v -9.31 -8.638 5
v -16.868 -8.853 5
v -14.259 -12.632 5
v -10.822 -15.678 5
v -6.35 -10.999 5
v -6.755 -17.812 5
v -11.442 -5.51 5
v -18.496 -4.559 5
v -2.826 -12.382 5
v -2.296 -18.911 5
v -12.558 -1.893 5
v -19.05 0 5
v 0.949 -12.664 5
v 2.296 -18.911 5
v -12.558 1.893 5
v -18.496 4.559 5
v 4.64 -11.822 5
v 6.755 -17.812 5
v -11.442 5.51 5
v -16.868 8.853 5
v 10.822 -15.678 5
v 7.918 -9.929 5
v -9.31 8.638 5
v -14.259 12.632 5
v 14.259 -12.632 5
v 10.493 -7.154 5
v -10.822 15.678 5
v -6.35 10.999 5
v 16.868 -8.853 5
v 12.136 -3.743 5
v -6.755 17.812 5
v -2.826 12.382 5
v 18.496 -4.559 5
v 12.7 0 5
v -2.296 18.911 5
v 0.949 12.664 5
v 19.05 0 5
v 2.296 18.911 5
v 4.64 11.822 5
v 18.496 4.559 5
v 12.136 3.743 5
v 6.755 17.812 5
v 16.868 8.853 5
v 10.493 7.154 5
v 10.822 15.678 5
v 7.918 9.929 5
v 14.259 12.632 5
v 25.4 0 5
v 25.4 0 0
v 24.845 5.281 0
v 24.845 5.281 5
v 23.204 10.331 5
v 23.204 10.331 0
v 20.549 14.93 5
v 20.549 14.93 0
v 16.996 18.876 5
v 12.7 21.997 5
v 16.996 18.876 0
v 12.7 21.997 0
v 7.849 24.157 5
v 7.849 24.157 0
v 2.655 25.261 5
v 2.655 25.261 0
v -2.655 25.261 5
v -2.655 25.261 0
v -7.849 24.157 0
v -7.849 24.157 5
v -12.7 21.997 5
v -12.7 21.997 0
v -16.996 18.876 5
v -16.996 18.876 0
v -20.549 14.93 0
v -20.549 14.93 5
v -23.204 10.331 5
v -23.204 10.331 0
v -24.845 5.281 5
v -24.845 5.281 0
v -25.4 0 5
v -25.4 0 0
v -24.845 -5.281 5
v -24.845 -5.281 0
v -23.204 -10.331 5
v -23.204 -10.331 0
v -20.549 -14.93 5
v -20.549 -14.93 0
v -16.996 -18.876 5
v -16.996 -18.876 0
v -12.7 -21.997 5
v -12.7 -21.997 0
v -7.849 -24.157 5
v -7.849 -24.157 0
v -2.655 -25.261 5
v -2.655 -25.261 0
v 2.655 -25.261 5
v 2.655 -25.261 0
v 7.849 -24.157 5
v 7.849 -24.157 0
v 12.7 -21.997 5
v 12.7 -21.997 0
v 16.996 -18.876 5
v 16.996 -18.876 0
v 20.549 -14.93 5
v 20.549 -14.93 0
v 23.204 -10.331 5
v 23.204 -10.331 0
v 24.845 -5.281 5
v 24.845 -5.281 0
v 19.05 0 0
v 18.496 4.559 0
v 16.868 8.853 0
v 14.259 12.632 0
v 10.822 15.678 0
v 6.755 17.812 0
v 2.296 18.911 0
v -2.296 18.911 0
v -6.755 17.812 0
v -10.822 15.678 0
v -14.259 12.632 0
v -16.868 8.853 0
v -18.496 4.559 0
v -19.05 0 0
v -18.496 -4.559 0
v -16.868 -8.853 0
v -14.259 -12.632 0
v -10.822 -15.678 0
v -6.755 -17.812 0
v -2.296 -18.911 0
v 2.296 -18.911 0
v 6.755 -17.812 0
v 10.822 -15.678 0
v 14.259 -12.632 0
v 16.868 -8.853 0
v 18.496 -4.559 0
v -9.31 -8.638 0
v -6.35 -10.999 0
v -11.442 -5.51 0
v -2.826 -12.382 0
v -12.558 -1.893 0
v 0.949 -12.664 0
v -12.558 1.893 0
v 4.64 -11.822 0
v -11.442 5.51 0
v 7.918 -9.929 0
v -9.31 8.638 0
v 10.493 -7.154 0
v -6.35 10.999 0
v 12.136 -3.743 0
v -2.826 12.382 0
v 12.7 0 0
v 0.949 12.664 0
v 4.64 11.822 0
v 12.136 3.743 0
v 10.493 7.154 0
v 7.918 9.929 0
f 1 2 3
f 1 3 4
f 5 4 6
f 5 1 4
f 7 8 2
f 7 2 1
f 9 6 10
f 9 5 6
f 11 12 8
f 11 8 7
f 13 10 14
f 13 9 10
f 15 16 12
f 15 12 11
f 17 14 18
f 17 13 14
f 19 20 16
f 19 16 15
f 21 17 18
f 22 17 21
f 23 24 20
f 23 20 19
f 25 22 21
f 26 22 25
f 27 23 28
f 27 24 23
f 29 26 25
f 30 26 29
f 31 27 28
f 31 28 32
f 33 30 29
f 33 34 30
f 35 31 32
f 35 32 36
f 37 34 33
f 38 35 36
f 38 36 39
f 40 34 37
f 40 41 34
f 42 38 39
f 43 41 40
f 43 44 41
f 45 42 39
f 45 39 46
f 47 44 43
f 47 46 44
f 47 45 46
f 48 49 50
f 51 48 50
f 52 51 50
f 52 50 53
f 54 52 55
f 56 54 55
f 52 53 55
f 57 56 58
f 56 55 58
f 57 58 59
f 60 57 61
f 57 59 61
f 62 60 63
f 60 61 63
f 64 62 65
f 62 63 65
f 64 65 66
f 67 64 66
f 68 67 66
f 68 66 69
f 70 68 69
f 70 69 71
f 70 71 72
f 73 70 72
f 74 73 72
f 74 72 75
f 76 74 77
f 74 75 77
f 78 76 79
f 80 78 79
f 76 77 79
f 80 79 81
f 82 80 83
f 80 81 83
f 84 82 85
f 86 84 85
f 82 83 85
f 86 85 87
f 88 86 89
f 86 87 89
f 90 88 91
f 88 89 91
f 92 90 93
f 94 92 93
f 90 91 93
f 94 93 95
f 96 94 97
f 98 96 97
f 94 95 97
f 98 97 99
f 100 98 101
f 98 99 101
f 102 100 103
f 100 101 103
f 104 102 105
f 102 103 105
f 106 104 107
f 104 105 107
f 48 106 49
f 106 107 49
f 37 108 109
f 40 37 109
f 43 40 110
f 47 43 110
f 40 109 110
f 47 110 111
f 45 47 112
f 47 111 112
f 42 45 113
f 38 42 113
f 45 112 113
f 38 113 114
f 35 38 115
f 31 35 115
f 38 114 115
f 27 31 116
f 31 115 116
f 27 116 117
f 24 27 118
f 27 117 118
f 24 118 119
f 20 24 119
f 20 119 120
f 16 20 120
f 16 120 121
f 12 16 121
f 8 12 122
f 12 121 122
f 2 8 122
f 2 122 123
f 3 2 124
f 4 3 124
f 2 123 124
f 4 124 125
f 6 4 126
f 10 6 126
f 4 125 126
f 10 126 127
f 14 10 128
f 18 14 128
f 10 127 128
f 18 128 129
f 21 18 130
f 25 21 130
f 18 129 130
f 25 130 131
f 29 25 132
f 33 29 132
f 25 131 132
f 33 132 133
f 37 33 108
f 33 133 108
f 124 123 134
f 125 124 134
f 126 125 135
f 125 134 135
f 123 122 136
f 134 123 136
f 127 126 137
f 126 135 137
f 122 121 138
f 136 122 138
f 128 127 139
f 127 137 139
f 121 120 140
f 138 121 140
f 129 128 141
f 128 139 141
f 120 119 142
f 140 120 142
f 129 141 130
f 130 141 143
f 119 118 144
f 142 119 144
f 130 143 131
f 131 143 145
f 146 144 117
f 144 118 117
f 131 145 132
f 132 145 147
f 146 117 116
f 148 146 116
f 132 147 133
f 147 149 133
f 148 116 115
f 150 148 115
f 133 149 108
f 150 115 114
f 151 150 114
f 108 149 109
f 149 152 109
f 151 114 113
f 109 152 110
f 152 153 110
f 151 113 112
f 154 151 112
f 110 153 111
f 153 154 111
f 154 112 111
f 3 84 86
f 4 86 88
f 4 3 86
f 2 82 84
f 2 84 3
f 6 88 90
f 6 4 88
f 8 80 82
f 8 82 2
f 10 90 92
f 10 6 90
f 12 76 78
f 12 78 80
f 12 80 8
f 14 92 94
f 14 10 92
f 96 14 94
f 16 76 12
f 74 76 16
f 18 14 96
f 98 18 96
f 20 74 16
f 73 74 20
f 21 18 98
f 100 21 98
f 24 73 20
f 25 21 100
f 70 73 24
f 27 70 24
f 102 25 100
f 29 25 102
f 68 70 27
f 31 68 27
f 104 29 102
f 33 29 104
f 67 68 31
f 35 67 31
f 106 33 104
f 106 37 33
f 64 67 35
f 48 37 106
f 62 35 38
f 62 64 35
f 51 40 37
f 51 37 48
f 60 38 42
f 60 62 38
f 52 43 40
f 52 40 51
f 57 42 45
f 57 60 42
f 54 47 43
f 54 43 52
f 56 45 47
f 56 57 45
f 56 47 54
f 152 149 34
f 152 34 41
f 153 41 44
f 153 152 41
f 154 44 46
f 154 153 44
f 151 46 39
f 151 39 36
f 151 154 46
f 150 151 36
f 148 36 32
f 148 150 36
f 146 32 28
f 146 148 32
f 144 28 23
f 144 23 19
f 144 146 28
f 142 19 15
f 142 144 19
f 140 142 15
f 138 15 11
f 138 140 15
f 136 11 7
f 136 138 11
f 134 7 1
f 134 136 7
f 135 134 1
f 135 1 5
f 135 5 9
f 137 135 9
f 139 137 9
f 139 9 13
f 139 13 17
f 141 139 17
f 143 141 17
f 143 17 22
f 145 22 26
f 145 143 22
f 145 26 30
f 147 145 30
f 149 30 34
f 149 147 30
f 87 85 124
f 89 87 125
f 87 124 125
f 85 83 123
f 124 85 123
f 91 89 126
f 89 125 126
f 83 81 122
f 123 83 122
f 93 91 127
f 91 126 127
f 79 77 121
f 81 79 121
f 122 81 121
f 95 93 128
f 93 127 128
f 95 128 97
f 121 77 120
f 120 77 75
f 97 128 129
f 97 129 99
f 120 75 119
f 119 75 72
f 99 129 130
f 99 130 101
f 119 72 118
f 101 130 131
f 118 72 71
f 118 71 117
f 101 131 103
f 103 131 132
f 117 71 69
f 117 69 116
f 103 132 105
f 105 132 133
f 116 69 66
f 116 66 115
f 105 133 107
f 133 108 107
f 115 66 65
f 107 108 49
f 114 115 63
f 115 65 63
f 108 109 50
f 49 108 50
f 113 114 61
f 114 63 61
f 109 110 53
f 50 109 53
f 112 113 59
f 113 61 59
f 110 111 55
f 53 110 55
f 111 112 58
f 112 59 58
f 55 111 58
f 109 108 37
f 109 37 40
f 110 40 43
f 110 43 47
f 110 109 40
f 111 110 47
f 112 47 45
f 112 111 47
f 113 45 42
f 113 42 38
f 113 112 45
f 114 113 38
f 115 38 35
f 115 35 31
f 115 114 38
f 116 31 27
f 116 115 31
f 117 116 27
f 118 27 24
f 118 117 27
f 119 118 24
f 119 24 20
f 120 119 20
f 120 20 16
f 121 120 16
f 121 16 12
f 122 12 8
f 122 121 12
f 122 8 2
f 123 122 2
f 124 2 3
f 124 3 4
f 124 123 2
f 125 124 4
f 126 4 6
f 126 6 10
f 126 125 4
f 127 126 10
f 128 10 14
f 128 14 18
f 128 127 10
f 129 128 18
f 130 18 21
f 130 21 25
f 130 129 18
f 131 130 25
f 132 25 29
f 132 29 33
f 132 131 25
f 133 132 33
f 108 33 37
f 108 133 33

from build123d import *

# Parameters (mm, degrees)
F0_R     = 25.4
F0_R_2   = 19.05
F1_DEPTH = 5
F0_R_3   = 12.7
F2_DEPTH = 5


with BuildPart() as f1:
    # F0 (on Top) → F1 (new body)
    with BuildSketch(Plane.XY):
        Circle(F0_R)
        Circle(F0_R_2, mode=Mode.SUBTRACT)
    extrude(amount=F1_DEPTH)


with BuildPart() as f2:
    # F0 (on Top) → F2 (new body)
    with BuildSketch(Plane.XY):
        Circle(F0_R_2)
        Circle(F0_R_3, mode=Mode.SUBTRACT)
    extrude(amount=F2_DEPTH)


solid = Compound([f1.part, f2.part])
